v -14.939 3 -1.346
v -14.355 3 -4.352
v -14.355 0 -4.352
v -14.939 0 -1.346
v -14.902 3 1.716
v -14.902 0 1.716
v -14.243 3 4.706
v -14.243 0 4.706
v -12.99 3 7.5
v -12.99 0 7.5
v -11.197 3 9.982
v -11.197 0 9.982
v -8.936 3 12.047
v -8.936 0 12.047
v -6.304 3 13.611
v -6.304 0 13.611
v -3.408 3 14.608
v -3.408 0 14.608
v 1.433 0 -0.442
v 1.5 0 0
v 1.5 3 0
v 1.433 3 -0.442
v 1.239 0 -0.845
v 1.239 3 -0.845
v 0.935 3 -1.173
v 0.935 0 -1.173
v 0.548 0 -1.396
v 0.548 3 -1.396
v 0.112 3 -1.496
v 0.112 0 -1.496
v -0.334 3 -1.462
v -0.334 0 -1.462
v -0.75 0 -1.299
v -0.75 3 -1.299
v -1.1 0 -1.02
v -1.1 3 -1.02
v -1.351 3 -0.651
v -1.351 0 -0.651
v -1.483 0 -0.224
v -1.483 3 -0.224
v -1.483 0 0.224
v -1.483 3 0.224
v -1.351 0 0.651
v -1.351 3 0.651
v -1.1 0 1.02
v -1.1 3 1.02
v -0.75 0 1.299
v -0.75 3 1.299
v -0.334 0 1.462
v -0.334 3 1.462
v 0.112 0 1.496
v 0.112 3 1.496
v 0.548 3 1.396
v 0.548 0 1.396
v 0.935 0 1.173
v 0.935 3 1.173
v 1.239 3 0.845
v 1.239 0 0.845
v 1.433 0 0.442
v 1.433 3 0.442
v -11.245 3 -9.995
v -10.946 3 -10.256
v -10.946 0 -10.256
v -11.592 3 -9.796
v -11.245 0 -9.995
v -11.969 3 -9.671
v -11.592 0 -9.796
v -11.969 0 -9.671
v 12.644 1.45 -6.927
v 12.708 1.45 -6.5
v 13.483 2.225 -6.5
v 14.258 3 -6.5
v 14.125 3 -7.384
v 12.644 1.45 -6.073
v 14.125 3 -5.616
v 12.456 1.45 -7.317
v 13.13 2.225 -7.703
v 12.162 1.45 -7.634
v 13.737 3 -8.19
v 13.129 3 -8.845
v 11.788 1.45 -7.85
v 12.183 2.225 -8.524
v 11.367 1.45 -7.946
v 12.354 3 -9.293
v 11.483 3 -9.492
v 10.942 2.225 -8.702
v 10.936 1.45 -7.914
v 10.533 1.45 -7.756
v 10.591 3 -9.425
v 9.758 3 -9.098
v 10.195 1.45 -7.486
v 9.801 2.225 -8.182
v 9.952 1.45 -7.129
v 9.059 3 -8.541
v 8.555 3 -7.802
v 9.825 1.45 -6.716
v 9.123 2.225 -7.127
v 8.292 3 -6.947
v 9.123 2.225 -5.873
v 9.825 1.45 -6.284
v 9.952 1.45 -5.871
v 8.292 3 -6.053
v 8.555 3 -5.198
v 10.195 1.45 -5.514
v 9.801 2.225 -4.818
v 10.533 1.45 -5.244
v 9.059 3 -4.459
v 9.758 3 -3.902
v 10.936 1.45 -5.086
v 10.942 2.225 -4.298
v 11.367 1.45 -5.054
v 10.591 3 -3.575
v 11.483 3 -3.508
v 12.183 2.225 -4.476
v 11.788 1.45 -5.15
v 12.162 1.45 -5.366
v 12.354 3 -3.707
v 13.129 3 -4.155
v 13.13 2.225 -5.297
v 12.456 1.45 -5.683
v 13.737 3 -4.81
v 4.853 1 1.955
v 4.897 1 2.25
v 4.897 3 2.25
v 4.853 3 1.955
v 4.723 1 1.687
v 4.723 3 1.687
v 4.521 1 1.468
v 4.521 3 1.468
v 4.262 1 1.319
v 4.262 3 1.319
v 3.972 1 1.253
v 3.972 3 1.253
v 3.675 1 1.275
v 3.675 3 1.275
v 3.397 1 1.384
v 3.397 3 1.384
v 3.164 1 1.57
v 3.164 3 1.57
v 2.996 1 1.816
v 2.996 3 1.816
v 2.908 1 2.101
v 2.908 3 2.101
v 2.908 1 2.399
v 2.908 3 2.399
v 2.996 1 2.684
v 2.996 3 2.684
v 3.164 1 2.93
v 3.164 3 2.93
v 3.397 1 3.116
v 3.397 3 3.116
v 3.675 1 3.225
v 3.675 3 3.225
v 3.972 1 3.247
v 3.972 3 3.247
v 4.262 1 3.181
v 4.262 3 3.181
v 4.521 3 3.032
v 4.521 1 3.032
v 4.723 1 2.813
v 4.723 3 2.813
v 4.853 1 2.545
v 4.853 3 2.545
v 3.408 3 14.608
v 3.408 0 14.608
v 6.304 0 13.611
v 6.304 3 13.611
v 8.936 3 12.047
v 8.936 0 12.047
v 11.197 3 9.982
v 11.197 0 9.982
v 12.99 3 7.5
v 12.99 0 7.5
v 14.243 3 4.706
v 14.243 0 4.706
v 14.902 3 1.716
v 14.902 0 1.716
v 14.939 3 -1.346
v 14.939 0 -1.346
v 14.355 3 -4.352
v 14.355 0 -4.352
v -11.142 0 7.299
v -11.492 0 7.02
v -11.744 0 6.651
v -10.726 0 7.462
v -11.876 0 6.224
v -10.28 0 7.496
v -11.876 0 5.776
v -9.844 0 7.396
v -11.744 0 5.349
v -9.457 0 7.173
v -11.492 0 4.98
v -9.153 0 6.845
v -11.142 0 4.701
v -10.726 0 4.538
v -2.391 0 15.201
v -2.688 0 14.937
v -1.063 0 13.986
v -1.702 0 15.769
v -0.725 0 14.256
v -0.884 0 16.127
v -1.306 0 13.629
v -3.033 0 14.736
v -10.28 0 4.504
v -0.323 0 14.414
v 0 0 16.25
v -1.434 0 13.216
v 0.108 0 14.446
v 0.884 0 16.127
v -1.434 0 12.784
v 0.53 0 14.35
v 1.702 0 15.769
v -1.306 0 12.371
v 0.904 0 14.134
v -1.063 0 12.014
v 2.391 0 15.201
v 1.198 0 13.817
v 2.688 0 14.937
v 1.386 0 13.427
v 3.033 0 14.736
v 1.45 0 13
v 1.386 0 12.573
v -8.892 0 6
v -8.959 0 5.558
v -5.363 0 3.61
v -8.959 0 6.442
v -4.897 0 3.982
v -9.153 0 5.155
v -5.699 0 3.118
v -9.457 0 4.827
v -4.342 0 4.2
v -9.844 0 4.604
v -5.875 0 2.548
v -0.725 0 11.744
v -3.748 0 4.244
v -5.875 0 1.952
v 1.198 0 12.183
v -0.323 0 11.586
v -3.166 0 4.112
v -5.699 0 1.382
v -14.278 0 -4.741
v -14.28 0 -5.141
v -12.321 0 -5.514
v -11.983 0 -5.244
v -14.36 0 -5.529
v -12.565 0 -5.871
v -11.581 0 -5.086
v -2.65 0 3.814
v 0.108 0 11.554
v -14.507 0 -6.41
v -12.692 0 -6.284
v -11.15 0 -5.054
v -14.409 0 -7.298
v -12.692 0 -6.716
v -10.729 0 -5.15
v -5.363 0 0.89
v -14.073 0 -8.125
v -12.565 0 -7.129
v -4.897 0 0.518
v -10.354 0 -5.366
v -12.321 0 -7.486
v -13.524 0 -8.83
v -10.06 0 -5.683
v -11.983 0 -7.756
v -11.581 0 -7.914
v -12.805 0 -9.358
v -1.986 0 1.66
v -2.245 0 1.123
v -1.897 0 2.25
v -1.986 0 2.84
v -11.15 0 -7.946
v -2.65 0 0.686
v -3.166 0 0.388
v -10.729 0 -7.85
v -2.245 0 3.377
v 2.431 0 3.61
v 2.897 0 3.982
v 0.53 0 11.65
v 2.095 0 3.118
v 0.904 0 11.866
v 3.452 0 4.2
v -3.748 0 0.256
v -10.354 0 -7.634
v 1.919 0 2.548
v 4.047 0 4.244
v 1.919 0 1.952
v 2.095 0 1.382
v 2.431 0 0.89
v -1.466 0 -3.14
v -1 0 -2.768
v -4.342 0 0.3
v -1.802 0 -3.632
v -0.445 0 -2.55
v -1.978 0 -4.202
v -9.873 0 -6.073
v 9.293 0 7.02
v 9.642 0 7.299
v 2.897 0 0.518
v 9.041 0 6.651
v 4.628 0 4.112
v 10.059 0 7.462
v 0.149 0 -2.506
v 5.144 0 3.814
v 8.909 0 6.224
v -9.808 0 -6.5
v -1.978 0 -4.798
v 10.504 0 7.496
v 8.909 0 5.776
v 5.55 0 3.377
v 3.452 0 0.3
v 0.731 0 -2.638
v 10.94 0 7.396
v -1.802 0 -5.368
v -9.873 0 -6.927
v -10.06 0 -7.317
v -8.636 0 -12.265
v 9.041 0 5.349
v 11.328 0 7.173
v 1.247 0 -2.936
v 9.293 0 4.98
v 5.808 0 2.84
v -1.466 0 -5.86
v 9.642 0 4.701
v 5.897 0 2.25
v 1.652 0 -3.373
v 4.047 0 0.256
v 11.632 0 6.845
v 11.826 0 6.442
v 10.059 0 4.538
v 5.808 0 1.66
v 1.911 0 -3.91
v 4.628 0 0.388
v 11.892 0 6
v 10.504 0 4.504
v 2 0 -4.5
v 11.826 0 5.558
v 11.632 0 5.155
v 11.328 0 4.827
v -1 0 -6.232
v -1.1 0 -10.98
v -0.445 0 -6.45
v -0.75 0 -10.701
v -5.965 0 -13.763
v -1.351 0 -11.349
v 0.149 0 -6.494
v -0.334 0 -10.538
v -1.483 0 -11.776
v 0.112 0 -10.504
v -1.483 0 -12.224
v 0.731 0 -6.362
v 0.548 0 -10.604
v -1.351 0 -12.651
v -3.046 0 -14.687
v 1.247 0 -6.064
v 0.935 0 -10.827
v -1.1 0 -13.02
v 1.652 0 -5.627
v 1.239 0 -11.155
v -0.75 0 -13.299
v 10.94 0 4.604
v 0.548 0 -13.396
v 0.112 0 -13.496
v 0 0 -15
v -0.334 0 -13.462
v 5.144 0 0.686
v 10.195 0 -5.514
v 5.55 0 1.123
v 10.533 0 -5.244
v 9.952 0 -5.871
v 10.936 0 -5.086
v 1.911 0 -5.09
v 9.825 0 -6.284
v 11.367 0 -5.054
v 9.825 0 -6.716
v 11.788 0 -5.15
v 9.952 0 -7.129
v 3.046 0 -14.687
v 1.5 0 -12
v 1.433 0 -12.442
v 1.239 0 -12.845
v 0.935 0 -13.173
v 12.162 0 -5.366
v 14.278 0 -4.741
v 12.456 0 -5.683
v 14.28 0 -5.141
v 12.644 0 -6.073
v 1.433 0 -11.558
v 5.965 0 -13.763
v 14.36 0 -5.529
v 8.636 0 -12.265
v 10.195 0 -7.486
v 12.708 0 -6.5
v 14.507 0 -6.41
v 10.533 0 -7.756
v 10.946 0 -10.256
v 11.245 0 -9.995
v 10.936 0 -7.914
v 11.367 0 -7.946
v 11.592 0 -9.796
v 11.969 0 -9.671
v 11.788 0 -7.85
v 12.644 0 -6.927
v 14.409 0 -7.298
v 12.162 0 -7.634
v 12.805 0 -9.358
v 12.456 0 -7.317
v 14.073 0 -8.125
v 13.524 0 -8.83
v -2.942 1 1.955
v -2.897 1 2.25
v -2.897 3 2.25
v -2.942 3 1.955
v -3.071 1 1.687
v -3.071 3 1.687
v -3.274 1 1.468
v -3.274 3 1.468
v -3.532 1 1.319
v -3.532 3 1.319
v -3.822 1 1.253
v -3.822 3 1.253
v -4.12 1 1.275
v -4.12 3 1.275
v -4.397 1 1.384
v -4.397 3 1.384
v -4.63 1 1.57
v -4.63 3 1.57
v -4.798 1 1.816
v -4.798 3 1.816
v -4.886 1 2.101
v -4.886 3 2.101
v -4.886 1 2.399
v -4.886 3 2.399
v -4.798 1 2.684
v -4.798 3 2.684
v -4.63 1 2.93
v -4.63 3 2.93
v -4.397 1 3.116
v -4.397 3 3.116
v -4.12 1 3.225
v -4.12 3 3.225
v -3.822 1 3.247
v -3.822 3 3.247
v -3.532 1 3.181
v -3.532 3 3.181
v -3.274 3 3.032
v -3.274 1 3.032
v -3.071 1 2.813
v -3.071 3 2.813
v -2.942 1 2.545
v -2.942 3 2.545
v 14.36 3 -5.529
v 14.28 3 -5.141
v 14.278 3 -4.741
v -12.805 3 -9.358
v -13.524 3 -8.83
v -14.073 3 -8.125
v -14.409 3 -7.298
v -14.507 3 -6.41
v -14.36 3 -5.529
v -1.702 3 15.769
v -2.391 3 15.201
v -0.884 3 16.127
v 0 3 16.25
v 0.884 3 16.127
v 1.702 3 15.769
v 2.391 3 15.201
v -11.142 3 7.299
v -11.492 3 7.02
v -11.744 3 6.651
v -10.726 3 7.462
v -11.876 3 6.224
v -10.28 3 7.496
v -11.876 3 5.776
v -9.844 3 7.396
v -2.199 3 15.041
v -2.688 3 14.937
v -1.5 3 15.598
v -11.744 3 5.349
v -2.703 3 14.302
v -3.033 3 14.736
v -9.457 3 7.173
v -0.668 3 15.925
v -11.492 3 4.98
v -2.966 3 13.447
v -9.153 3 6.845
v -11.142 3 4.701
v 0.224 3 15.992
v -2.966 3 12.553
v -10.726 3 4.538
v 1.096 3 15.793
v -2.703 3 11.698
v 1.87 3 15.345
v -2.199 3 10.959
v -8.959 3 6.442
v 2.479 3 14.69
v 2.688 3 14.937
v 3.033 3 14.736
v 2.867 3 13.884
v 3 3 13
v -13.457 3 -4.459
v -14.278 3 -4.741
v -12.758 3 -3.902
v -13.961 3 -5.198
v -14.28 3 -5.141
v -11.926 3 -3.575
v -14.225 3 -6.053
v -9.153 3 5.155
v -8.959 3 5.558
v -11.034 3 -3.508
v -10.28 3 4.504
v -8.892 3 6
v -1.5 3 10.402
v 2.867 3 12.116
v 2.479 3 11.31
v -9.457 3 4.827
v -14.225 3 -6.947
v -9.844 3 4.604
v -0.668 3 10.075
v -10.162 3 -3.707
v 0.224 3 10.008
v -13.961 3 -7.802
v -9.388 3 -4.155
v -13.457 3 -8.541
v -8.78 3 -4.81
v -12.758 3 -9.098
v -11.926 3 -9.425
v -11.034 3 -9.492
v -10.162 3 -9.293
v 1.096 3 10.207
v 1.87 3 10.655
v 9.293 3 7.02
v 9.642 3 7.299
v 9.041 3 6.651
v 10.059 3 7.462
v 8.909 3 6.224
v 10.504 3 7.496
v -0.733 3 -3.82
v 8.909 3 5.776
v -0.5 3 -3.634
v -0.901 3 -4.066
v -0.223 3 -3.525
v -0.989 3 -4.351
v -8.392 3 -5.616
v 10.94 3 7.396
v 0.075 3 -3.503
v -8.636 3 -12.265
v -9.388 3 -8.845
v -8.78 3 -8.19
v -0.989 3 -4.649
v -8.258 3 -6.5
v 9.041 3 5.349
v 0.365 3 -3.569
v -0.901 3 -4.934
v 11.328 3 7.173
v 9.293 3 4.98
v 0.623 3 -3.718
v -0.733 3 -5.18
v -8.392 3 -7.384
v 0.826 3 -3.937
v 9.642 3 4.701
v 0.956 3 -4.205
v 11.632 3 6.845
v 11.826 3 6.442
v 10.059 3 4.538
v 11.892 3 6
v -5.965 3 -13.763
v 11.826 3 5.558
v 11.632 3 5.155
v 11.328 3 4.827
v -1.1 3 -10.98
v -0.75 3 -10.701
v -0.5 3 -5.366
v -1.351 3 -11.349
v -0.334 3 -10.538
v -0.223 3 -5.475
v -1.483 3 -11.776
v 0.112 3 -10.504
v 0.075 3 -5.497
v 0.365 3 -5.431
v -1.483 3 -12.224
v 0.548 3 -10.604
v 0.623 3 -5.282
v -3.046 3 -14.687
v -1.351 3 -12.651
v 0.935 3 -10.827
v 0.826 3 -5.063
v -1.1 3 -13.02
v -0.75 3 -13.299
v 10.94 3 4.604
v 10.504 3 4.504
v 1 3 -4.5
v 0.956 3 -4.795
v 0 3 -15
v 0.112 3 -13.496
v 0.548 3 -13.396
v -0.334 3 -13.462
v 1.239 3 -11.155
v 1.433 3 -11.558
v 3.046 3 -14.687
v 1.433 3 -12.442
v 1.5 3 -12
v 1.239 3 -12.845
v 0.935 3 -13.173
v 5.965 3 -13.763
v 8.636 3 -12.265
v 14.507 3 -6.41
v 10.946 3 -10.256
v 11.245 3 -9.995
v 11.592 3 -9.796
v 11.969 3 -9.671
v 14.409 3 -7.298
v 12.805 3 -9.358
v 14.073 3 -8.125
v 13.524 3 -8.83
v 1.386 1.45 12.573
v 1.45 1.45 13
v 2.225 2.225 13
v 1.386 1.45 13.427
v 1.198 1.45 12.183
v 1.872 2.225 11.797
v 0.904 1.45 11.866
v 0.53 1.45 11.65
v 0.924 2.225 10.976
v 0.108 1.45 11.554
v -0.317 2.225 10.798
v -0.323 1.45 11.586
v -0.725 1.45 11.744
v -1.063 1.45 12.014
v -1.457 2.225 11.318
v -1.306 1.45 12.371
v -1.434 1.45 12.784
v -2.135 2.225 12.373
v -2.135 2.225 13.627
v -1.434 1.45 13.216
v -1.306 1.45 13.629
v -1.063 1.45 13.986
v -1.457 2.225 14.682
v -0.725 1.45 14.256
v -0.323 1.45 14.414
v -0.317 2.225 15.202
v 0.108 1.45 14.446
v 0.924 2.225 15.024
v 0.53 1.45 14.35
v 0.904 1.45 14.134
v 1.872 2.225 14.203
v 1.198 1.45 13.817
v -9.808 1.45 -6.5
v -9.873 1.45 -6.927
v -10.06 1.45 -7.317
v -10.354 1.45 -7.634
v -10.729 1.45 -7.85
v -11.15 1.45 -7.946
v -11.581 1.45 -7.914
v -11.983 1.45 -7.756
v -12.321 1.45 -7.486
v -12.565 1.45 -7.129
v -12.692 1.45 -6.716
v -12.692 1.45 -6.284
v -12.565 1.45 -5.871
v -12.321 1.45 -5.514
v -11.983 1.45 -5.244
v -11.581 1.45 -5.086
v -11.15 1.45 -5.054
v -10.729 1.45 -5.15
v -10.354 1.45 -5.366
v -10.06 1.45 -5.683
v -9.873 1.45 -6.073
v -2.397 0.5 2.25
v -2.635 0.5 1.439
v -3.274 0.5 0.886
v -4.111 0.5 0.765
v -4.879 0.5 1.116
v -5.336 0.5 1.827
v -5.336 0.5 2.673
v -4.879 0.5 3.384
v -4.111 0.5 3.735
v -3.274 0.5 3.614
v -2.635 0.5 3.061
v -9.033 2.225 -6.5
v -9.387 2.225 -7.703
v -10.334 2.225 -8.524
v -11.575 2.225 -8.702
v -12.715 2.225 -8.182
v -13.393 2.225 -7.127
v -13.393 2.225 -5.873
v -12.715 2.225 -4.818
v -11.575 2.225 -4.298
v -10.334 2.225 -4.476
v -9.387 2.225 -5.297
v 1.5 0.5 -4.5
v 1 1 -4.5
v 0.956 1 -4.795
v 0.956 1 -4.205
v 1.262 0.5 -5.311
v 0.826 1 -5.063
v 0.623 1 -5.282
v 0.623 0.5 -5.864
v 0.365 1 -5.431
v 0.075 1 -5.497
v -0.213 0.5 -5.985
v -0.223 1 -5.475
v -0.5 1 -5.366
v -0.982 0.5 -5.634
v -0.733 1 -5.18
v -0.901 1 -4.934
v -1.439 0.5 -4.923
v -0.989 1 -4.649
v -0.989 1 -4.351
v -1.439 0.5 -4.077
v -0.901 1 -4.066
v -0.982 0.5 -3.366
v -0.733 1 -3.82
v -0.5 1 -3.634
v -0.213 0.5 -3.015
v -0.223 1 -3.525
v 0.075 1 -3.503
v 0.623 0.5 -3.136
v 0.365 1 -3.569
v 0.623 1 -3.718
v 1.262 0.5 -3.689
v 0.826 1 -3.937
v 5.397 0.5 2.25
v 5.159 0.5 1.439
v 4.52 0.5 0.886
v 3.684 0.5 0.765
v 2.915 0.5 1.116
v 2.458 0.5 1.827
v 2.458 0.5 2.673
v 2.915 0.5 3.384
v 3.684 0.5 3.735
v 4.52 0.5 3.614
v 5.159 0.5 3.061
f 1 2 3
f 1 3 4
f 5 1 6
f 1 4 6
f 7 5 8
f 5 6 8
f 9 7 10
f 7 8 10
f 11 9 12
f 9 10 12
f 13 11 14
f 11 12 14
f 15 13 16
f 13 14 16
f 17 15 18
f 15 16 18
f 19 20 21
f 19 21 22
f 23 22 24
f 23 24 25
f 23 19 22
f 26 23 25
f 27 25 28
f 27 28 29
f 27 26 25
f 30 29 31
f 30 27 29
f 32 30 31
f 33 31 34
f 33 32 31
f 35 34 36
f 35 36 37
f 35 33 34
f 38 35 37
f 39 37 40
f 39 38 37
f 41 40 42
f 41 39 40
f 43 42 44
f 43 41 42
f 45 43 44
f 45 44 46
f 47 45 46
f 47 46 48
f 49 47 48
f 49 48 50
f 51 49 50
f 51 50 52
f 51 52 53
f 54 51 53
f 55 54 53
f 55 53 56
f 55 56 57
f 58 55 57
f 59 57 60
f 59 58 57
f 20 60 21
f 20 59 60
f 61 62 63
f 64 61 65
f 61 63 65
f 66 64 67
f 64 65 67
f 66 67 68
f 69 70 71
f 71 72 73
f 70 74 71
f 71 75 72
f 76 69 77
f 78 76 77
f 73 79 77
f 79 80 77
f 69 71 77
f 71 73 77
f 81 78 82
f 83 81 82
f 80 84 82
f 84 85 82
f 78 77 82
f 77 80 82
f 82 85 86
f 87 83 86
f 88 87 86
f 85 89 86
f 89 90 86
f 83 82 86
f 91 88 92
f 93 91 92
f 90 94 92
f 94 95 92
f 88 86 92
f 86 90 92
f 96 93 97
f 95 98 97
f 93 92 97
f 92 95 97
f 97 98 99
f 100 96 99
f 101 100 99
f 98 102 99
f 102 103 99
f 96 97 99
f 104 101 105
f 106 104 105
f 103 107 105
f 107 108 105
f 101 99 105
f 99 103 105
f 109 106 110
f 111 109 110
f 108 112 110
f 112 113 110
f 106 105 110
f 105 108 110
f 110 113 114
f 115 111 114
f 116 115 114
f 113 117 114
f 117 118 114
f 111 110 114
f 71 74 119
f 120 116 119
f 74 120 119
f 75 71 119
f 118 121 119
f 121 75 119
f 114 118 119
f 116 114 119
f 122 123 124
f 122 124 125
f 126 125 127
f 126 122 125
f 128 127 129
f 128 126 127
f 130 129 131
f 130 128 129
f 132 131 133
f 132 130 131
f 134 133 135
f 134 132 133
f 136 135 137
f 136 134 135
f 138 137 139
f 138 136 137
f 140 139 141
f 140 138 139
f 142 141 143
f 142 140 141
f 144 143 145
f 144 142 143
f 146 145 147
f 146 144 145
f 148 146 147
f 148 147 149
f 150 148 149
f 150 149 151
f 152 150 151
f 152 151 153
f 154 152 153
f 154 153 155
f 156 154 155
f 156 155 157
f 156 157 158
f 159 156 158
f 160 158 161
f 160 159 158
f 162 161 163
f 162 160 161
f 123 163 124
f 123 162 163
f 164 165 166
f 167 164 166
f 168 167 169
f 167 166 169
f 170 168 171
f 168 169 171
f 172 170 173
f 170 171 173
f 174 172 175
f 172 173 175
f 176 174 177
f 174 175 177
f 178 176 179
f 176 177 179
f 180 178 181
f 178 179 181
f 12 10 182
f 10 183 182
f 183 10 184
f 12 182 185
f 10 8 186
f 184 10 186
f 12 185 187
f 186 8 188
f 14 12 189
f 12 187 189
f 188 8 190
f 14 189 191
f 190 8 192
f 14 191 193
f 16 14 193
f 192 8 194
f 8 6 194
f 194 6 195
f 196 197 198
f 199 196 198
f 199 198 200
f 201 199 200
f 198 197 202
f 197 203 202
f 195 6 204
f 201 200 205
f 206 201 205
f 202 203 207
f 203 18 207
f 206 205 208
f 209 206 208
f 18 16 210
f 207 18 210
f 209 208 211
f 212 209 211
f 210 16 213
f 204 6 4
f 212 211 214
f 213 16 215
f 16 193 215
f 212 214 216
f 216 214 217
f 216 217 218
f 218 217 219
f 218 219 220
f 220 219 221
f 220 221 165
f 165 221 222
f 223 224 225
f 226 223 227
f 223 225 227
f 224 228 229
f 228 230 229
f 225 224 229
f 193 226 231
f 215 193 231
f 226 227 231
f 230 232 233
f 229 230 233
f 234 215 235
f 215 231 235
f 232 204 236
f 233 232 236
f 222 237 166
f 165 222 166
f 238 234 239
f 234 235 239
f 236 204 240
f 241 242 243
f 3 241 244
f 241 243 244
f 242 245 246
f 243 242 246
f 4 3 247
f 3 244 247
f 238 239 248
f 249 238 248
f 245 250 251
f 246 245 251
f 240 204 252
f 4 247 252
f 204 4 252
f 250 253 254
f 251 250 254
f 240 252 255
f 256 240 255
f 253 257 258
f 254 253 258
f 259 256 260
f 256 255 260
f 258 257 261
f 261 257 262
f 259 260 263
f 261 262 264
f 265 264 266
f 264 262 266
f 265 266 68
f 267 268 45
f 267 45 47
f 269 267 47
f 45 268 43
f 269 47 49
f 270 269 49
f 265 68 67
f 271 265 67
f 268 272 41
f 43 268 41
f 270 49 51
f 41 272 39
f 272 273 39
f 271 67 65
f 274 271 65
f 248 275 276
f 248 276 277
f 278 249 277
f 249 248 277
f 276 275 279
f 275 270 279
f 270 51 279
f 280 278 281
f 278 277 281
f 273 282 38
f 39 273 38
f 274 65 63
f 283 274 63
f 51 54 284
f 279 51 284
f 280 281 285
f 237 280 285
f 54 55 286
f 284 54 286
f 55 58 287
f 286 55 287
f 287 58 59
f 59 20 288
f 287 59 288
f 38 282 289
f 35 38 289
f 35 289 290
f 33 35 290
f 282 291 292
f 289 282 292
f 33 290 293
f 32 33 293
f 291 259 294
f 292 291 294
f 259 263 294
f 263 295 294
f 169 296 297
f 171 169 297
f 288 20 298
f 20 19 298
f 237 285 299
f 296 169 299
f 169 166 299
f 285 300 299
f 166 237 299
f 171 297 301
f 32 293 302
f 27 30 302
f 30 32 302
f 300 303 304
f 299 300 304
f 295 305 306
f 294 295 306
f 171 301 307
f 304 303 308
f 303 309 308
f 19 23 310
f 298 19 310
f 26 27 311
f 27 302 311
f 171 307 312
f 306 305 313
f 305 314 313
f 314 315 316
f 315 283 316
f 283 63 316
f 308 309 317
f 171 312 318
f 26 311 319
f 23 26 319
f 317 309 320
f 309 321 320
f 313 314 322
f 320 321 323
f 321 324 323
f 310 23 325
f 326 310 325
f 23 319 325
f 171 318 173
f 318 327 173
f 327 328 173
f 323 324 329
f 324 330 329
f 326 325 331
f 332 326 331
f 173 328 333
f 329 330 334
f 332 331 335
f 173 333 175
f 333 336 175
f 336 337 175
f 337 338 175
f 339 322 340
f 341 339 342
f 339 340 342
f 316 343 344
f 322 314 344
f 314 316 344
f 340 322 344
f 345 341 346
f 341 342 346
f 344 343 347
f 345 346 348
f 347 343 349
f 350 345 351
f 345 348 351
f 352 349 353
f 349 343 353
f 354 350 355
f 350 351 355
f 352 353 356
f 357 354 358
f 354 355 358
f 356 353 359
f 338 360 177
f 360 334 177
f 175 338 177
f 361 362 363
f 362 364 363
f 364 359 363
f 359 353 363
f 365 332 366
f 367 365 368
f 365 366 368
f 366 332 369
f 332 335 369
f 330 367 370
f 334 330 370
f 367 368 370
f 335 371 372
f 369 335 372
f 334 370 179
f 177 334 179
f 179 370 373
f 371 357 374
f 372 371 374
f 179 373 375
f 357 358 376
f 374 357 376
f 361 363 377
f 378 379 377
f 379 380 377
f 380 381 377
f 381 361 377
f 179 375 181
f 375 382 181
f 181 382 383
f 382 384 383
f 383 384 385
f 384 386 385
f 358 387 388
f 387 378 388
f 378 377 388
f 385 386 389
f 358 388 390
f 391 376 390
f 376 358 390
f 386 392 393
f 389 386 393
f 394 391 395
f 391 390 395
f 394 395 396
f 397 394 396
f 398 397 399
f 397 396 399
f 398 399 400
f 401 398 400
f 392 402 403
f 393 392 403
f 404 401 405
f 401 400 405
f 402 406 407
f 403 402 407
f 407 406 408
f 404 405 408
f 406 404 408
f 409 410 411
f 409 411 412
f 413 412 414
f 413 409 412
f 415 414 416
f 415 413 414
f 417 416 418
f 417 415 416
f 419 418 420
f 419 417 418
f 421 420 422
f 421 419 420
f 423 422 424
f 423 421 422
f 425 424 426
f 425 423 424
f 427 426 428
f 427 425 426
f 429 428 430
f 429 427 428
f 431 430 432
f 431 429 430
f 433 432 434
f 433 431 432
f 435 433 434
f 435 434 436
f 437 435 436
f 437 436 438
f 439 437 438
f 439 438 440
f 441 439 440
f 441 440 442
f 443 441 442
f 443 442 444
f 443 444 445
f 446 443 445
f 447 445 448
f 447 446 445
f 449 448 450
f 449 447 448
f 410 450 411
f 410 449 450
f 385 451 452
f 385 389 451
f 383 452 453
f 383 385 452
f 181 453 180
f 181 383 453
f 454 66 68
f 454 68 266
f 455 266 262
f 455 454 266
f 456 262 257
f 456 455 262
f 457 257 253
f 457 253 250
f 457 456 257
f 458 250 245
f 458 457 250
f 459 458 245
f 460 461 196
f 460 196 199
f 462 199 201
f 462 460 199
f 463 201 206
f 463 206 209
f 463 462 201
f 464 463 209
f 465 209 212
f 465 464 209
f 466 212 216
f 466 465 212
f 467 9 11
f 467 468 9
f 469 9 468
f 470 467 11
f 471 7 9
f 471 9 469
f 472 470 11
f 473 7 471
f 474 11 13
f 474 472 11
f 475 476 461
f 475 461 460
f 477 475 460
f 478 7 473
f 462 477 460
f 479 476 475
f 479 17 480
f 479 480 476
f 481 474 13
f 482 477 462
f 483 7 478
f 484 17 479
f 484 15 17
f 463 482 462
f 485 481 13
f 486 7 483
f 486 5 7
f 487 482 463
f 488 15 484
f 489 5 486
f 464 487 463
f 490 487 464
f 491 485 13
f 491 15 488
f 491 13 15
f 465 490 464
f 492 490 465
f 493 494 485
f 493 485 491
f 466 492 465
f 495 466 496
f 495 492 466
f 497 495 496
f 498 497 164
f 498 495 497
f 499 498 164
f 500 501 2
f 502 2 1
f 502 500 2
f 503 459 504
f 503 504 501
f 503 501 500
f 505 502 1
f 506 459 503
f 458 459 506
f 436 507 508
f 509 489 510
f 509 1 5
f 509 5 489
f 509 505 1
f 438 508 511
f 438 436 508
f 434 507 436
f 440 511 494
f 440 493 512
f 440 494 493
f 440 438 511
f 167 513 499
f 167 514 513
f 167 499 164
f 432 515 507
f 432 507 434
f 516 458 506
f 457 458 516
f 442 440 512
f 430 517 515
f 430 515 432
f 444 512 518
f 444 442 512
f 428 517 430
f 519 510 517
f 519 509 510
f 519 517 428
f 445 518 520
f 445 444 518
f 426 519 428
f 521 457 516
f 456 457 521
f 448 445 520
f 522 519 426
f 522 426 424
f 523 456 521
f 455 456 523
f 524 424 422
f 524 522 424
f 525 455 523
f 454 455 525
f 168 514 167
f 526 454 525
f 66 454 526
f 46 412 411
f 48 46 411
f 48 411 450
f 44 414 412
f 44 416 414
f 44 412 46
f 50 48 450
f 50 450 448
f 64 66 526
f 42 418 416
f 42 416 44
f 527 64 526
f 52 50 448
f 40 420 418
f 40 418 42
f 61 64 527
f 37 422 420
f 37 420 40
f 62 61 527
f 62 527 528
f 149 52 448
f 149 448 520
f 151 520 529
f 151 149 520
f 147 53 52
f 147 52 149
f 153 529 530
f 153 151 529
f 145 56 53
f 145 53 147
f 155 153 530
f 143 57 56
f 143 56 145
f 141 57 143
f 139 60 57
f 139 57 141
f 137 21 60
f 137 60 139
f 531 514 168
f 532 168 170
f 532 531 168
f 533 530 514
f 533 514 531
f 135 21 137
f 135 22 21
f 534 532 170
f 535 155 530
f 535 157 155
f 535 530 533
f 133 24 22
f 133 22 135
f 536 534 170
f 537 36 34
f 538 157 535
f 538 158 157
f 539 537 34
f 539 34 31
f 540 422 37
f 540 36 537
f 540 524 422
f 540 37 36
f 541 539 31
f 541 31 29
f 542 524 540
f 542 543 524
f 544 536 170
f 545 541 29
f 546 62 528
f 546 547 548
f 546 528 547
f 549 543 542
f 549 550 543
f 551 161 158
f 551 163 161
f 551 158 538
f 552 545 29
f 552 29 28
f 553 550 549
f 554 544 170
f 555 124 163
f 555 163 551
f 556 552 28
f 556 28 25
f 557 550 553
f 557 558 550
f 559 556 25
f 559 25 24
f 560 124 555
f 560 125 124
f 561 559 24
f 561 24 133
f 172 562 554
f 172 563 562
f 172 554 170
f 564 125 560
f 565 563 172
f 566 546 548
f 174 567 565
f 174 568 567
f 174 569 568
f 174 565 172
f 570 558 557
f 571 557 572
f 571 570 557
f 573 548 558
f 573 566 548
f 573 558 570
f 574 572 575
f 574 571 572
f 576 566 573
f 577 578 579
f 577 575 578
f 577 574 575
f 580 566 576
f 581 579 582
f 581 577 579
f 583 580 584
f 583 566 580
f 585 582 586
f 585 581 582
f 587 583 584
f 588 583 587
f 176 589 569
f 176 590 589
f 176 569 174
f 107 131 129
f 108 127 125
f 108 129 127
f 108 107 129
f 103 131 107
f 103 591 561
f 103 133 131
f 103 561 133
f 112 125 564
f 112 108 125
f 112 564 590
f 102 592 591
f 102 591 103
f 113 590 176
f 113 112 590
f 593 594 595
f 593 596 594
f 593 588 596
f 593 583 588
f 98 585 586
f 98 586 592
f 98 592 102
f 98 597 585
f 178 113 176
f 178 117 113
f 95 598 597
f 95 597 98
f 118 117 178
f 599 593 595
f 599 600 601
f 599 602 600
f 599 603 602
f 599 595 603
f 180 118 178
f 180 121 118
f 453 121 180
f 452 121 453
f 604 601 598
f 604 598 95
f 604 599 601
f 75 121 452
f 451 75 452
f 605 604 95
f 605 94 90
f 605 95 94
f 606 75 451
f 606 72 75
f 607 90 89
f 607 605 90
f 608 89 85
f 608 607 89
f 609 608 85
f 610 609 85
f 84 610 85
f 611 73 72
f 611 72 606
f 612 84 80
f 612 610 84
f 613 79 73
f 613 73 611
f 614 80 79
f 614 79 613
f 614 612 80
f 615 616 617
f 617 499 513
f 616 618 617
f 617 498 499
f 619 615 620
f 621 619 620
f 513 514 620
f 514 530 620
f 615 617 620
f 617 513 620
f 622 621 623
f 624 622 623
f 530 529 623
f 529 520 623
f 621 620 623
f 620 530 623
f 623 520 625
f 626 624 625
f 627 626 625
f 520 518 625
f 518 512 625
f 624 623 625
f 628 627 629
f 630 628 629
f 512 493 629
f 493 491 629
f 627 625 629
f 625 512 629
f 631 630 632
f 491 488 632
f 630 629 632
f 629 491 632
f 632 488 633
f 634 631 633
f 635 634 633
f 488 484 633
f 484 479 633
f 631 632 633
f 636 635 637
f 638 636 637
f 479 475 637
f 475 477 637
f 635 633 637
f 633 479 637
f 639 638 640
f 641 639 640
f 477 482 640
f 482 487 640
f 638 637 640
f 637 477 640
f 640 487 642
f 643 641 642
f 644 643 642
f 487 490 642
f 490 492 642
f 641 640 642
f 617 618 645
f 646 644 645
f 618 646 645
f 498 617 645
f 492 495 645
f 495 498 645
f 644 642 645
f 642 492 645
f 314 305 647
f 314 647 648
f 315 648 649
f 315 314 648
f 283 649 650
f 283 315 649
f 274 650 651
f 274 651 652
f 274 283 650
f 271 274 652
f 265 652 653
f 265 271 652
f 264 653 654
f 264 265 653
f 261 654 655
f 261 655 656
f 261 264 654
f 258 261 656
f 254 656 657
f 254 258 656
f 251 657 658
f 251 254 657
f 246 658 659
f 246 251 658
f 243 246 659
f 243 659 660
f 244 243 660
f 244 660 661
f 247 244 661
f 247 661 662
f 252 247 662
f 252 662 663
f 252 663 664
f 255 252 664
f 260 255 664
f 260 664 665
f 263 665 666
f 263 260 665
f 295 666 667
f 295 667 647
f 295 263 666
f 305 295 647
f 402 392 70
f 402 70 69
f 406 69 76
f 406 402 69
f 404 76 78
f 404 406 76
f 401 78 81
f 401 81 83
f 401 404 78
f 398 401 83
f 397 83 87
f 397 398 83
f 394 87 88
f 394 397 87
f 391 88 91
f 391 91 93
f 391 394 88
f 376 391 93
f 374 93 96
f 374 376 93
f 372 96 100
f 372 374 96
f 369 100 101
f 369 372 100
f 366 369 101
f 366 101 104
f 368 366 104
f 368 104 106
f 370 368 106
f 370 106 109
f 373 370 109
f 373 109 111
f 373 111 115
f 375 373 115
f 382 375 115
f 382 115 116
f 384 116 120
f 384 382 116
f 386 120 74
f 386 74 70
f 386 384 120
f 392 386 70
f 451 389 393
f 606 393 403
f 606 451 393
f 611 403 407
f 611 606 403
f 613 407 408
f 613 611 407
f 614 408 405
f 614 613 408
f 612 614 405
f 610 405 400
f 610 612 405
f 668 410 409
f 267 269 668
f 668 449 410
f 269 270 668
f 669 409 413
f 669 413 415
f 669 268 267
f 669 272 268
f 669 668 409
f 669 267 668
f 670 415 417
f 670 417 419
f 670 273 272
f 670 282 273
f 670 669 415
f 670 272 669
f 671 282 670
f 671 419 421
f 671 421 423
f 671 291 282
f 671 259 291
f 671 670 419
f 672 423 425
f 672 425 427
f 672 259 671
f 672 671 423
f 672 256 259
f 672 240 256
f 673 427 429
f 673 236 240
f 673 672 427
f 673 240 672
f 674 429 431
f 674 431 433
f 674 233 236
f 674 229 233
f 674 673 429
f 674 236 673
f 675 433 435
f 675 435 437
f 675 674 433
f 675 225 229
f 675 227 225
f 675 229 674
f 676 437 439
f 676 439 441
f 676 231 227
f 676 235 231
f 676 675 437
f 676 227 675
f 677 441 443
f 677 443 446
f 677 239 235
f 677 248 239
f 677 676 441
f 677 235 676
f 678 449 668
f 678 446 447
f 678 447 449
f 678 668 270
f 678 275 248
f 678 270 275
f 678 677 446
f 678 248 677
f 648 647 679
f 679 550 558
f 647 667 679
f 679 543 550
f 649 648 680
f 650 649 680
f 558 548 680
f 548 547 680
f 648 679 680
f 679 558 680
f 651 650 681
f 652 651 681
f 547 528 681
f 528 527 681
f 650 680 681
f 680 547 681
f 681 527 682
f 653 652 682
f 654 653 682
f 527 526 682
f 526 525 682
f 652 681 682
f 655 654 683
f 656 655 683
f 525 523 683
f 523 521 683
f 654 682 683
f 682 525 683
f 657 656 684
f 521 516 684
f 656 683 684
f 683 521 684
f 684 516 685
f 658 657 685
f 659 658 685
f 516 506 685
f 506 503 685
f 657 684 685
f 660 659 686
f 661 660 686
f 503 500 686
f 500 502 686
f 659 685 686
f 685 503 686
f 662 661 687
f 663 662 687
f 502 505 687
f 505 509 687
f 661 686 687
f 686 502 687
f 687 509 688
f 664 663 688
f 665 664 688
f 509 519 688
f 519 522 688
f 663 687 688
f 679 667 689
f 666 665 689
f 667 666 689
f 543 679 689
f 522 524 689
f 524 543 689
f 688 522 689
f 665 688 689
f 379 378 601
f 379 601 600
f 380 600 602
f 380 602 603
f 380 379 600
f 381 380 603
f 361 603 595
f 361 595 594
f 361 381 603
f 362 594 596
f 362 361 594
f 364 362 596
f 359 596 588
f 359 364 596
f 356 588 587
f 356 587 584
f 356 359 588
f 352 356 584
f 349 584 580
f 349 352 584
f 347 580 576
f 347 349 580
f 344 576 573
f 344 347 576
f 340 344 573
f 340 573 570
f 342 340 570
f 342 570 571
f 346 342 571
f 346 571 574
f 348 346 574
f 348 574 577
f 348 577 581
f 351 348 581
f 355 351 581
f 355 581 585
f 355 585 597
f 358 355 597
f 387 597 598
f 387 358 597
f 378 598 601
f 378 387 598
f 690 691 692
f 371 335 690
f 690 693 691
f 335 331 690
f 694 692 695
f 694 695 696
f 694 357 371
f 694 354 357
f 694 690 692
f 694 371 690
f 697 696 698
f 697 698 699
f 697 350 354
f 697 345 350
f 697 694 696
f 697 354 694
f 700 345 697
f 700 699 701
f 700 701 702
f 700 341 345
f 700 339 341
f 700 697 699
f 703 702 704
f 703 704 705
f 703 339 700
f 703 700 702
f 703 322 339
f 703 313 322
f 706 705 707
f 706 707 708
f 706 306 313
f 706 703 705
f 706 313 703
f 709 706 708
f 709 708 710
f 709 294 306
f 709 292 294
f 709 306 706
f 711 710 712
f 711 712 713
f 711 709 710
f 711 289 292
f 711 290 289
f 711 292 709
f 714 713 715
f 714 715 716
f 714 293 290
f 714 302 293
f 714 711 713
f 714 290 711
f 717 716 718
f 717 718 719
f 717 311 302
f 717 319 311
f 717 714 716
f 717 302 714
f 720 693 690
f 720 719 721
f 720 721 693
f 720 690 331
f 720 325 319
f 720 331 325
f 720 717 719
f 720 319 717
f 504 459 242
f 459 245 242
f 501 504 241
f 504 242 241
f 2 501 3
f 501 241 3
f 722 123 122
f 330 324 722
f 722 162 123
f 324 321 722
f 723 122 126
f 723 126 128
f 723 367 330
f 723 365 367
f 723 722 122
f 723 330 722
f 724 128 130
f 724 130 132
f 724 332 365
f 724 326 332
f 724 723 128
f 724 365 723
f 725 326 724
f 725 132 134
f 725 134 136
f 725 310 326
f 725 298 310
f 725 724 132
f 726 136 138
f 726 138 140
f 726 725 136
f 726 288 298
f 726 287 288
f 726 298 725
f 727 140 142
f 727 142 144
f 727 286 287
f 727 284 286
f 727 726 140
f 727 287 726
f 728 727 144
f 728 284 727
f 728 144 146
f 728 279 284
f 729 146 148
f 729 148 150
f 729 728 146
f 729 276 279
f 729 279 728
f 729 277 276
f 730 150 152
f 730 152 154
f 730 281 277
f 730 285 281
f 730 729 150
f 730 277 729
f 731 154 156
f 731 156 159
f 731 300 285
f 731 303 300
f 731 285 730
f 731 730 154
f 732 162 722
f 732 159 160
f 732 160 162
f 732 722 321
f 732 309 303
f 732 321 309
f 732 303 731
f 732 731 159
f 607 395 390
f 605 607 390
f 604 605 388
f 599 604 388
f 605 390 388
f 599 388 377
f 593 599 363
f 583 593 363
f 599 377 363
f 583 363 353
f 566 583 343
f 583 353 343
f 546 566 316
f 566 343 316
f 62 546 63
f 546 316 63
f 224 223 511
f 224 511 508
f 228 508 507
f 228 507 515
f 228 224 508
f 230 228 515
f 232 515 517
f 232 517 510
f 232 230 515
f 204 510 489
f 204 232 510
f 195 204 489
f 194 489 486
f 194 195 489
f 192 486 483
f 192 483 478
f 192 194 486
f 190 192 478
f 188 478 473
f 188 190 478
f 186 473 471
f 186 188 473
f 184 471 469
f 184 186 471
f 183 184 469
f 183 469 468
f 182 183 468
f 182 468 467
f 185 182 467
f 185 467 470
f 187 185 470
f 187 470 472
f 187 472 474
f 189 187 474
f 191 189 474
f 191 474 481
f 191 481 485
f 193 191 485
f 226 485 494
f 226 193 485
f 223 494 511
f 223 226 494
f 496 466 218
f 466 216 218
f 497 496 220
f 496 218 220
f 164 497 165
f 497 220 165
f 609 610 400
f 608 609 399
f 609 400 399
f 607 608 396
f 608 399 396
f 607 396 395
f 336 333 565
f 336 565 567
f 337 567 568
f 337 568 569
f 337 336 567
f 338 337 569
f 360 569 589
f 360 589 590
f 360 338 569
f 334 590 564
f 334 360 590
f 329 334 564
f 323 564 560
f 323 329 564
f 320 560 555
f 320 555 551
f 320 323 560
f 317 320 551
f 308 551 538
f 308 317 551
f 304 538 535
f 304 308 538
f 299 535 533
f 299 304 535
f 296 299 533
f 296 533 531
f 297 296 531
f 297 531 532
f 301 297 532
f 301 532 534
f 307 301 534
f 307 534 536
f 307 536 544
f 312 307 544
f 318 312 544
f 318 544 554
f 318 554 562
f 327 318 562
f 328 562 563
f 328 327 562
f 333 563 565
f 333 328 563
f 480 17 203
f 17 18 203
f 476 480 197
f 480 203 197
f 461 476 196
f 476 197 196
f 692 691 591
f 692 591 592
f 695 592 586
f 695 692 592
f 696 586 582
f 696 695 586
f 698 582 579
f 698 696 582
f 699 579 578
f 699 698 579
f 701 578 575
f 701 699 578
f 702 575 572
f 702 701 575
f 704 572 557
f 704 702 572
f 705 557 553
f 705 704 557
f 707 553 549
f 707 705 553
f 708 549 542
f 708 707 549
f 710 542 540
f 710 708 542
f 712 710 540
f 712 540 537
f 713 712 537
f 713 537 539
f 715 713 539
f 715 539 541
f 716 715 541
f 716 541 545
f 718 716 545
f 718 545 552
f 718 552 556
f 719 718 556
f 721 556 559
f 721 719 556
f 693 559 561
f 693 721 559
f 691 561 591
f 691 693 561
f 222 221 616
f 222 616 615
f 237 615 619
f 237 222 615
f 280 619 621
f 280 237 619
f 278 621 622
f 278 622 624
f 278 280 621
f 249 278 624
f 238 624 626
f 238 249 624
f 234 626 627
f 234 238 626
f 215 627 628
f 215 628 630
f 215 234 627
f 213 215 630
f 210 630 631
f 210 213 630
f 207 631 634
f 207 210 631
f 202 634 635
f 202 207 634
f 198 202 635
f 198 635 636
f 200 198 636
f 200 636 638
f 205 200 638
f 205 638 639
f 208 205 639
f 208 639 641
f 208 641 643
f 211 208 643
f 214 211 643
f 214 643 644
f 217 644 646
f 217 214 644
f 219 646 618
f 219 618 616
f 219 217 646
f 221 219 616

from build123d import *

# Parameters (mm, degrees)
SKETCH_1_R      = 15
SKETCH_1_R_2    = 1.45
SKETCH_1_R_3    = 1.5
SKETCH_1_R_4    = 1
EXTRUDE_1_DEPTH = 3
CHAMFER_1_SIZE  = 1
SKETCH_2_R      = 3.25
SKETCH_2_R_2    = 1.45
EXTRUDE_2_DEPTH = 3
CHAMFER_2_SIZE  = 1.55
FILLET_1_R      = 2


with BuildPart() as part:
    # 草图1 → 凸台-拉伸1 (new body)
    with BuildSketch(Plane(origin=(0, 0, 0), x_dir=(1, 0, 0), z_dir=(0, 1, 0))):
        Circle(SKETCH_1_R)
        with Locations((0, -13)):
            Circle(SKETCH_1_R_2, mode=Mode.SUBTRACT)
        with Locations((-11.258330249, 6.5)):
            Circle(SKETCH_1_R_2, mode=Mode.SUBTRACT)
        with Locations((11.258330249, 6.5)):
            Circle(SKETCH_1_R_2, mode=Mode.SUBTRACT)
        with Locations((0, 12)):
            Circle(SKETCH_1_R_3, mode=Mode.SUBTRACT)
        with Locations((10.392304845, -6)):
            Circle(SKETCH_1_R_3, mode=Mode.SUBTRACT)
        with Locations((-10.392304845, -6)):
            Circle(SKETCH_1_R_3, mode=Mode.SUBTRACT)
        with Locations((0, 4.5)):
            Circle(SKETCH_1_R_4, mode=Mode.SUBTRACT)
        with Locations((3.897114317, -2.25)):
            Circle(SKETCH_1_R_4, mode=Mode.SUBTRACT)
        with Locations((-3.897114317, -2.25)):
            Circle(SKETCH_1_R_4, mode=Mode.SUBTRACT)
        Circle(SKETCH_1_R_3, mode=Mode.SUBTRACT)
    extrude(amount=EXTRUDE_1_DEPTH)

    # 倒角1
    chamfer_1_edges = [part.edges().sort_by_distance(p)[0] for p in [
        (-1, 0, -4.5),
        (2.897114317, 0, 2.25),
        (-4.897114317, 0, 2.25),
    ]]
    chamfer(chamfer_1_edges, length=CHAMFER_1_SIZE)

    # 草图2 → 凸台-拉伸2 (add)
    with BuildSketch(Plane(origin=(0, 3, 0), x_dir=(1, 0, 0), z_dir=(0, 1, 0))):
        with Locations((11.258330249, 6.5)):
            Circle(SKETCH_2_R)
        with Locations((11.258330249, 6.5)):
            Circle(SKETCH_2_R_2, mode=Mode.SUBTRACT)
        with Locations((0, -13)):
            Circle(SKETCH_2_R)
        with Locations((0, -13)):
            Circle(SKETCH_2_R_2, mode=Mode.SUBTRACT)
        with Locations((-11.258330249, 6.5)):
            Circle(SKETCH_2_R)
        with Locations((-11.258330249, 6.5)):
            Circle(SKETCH_2_R_2, mode=Mode.SUBTRACT)
    extrude(amount=-EXTRUDE_2_DEPTH)

    # 倒角2
    chamfer_2_edges = [part.edges().sort_by_distance(p)[0] for p in [
        (9.808330249, 3, -6.5),
        (-1.45, 3, 13),
        (-12.708330249, 3, -6.5),
    ]]
    chamfer(chamfer_2_edges, length=CHAMFER_2_SIZE)

    # 圆角1
    fillet_1_edges = [part.edges().sort_by_distance(p)[0] for p in [
        (11.401719222, 1.5, -9.746835321),
        (14.141866606, 1.5, -5.000760833),
        (2.740147383, 1.5, 14.747596154),
        (-2.740147383, 1.5, 14.747596154),
        (-11.401719222, 1.5, -9.746835321),
        (-14.141866606, 1.5, -5.000760833),
    ]]
    fillet(fillet_1_edges, radius=FILLET_1_R)


solid = part.part
